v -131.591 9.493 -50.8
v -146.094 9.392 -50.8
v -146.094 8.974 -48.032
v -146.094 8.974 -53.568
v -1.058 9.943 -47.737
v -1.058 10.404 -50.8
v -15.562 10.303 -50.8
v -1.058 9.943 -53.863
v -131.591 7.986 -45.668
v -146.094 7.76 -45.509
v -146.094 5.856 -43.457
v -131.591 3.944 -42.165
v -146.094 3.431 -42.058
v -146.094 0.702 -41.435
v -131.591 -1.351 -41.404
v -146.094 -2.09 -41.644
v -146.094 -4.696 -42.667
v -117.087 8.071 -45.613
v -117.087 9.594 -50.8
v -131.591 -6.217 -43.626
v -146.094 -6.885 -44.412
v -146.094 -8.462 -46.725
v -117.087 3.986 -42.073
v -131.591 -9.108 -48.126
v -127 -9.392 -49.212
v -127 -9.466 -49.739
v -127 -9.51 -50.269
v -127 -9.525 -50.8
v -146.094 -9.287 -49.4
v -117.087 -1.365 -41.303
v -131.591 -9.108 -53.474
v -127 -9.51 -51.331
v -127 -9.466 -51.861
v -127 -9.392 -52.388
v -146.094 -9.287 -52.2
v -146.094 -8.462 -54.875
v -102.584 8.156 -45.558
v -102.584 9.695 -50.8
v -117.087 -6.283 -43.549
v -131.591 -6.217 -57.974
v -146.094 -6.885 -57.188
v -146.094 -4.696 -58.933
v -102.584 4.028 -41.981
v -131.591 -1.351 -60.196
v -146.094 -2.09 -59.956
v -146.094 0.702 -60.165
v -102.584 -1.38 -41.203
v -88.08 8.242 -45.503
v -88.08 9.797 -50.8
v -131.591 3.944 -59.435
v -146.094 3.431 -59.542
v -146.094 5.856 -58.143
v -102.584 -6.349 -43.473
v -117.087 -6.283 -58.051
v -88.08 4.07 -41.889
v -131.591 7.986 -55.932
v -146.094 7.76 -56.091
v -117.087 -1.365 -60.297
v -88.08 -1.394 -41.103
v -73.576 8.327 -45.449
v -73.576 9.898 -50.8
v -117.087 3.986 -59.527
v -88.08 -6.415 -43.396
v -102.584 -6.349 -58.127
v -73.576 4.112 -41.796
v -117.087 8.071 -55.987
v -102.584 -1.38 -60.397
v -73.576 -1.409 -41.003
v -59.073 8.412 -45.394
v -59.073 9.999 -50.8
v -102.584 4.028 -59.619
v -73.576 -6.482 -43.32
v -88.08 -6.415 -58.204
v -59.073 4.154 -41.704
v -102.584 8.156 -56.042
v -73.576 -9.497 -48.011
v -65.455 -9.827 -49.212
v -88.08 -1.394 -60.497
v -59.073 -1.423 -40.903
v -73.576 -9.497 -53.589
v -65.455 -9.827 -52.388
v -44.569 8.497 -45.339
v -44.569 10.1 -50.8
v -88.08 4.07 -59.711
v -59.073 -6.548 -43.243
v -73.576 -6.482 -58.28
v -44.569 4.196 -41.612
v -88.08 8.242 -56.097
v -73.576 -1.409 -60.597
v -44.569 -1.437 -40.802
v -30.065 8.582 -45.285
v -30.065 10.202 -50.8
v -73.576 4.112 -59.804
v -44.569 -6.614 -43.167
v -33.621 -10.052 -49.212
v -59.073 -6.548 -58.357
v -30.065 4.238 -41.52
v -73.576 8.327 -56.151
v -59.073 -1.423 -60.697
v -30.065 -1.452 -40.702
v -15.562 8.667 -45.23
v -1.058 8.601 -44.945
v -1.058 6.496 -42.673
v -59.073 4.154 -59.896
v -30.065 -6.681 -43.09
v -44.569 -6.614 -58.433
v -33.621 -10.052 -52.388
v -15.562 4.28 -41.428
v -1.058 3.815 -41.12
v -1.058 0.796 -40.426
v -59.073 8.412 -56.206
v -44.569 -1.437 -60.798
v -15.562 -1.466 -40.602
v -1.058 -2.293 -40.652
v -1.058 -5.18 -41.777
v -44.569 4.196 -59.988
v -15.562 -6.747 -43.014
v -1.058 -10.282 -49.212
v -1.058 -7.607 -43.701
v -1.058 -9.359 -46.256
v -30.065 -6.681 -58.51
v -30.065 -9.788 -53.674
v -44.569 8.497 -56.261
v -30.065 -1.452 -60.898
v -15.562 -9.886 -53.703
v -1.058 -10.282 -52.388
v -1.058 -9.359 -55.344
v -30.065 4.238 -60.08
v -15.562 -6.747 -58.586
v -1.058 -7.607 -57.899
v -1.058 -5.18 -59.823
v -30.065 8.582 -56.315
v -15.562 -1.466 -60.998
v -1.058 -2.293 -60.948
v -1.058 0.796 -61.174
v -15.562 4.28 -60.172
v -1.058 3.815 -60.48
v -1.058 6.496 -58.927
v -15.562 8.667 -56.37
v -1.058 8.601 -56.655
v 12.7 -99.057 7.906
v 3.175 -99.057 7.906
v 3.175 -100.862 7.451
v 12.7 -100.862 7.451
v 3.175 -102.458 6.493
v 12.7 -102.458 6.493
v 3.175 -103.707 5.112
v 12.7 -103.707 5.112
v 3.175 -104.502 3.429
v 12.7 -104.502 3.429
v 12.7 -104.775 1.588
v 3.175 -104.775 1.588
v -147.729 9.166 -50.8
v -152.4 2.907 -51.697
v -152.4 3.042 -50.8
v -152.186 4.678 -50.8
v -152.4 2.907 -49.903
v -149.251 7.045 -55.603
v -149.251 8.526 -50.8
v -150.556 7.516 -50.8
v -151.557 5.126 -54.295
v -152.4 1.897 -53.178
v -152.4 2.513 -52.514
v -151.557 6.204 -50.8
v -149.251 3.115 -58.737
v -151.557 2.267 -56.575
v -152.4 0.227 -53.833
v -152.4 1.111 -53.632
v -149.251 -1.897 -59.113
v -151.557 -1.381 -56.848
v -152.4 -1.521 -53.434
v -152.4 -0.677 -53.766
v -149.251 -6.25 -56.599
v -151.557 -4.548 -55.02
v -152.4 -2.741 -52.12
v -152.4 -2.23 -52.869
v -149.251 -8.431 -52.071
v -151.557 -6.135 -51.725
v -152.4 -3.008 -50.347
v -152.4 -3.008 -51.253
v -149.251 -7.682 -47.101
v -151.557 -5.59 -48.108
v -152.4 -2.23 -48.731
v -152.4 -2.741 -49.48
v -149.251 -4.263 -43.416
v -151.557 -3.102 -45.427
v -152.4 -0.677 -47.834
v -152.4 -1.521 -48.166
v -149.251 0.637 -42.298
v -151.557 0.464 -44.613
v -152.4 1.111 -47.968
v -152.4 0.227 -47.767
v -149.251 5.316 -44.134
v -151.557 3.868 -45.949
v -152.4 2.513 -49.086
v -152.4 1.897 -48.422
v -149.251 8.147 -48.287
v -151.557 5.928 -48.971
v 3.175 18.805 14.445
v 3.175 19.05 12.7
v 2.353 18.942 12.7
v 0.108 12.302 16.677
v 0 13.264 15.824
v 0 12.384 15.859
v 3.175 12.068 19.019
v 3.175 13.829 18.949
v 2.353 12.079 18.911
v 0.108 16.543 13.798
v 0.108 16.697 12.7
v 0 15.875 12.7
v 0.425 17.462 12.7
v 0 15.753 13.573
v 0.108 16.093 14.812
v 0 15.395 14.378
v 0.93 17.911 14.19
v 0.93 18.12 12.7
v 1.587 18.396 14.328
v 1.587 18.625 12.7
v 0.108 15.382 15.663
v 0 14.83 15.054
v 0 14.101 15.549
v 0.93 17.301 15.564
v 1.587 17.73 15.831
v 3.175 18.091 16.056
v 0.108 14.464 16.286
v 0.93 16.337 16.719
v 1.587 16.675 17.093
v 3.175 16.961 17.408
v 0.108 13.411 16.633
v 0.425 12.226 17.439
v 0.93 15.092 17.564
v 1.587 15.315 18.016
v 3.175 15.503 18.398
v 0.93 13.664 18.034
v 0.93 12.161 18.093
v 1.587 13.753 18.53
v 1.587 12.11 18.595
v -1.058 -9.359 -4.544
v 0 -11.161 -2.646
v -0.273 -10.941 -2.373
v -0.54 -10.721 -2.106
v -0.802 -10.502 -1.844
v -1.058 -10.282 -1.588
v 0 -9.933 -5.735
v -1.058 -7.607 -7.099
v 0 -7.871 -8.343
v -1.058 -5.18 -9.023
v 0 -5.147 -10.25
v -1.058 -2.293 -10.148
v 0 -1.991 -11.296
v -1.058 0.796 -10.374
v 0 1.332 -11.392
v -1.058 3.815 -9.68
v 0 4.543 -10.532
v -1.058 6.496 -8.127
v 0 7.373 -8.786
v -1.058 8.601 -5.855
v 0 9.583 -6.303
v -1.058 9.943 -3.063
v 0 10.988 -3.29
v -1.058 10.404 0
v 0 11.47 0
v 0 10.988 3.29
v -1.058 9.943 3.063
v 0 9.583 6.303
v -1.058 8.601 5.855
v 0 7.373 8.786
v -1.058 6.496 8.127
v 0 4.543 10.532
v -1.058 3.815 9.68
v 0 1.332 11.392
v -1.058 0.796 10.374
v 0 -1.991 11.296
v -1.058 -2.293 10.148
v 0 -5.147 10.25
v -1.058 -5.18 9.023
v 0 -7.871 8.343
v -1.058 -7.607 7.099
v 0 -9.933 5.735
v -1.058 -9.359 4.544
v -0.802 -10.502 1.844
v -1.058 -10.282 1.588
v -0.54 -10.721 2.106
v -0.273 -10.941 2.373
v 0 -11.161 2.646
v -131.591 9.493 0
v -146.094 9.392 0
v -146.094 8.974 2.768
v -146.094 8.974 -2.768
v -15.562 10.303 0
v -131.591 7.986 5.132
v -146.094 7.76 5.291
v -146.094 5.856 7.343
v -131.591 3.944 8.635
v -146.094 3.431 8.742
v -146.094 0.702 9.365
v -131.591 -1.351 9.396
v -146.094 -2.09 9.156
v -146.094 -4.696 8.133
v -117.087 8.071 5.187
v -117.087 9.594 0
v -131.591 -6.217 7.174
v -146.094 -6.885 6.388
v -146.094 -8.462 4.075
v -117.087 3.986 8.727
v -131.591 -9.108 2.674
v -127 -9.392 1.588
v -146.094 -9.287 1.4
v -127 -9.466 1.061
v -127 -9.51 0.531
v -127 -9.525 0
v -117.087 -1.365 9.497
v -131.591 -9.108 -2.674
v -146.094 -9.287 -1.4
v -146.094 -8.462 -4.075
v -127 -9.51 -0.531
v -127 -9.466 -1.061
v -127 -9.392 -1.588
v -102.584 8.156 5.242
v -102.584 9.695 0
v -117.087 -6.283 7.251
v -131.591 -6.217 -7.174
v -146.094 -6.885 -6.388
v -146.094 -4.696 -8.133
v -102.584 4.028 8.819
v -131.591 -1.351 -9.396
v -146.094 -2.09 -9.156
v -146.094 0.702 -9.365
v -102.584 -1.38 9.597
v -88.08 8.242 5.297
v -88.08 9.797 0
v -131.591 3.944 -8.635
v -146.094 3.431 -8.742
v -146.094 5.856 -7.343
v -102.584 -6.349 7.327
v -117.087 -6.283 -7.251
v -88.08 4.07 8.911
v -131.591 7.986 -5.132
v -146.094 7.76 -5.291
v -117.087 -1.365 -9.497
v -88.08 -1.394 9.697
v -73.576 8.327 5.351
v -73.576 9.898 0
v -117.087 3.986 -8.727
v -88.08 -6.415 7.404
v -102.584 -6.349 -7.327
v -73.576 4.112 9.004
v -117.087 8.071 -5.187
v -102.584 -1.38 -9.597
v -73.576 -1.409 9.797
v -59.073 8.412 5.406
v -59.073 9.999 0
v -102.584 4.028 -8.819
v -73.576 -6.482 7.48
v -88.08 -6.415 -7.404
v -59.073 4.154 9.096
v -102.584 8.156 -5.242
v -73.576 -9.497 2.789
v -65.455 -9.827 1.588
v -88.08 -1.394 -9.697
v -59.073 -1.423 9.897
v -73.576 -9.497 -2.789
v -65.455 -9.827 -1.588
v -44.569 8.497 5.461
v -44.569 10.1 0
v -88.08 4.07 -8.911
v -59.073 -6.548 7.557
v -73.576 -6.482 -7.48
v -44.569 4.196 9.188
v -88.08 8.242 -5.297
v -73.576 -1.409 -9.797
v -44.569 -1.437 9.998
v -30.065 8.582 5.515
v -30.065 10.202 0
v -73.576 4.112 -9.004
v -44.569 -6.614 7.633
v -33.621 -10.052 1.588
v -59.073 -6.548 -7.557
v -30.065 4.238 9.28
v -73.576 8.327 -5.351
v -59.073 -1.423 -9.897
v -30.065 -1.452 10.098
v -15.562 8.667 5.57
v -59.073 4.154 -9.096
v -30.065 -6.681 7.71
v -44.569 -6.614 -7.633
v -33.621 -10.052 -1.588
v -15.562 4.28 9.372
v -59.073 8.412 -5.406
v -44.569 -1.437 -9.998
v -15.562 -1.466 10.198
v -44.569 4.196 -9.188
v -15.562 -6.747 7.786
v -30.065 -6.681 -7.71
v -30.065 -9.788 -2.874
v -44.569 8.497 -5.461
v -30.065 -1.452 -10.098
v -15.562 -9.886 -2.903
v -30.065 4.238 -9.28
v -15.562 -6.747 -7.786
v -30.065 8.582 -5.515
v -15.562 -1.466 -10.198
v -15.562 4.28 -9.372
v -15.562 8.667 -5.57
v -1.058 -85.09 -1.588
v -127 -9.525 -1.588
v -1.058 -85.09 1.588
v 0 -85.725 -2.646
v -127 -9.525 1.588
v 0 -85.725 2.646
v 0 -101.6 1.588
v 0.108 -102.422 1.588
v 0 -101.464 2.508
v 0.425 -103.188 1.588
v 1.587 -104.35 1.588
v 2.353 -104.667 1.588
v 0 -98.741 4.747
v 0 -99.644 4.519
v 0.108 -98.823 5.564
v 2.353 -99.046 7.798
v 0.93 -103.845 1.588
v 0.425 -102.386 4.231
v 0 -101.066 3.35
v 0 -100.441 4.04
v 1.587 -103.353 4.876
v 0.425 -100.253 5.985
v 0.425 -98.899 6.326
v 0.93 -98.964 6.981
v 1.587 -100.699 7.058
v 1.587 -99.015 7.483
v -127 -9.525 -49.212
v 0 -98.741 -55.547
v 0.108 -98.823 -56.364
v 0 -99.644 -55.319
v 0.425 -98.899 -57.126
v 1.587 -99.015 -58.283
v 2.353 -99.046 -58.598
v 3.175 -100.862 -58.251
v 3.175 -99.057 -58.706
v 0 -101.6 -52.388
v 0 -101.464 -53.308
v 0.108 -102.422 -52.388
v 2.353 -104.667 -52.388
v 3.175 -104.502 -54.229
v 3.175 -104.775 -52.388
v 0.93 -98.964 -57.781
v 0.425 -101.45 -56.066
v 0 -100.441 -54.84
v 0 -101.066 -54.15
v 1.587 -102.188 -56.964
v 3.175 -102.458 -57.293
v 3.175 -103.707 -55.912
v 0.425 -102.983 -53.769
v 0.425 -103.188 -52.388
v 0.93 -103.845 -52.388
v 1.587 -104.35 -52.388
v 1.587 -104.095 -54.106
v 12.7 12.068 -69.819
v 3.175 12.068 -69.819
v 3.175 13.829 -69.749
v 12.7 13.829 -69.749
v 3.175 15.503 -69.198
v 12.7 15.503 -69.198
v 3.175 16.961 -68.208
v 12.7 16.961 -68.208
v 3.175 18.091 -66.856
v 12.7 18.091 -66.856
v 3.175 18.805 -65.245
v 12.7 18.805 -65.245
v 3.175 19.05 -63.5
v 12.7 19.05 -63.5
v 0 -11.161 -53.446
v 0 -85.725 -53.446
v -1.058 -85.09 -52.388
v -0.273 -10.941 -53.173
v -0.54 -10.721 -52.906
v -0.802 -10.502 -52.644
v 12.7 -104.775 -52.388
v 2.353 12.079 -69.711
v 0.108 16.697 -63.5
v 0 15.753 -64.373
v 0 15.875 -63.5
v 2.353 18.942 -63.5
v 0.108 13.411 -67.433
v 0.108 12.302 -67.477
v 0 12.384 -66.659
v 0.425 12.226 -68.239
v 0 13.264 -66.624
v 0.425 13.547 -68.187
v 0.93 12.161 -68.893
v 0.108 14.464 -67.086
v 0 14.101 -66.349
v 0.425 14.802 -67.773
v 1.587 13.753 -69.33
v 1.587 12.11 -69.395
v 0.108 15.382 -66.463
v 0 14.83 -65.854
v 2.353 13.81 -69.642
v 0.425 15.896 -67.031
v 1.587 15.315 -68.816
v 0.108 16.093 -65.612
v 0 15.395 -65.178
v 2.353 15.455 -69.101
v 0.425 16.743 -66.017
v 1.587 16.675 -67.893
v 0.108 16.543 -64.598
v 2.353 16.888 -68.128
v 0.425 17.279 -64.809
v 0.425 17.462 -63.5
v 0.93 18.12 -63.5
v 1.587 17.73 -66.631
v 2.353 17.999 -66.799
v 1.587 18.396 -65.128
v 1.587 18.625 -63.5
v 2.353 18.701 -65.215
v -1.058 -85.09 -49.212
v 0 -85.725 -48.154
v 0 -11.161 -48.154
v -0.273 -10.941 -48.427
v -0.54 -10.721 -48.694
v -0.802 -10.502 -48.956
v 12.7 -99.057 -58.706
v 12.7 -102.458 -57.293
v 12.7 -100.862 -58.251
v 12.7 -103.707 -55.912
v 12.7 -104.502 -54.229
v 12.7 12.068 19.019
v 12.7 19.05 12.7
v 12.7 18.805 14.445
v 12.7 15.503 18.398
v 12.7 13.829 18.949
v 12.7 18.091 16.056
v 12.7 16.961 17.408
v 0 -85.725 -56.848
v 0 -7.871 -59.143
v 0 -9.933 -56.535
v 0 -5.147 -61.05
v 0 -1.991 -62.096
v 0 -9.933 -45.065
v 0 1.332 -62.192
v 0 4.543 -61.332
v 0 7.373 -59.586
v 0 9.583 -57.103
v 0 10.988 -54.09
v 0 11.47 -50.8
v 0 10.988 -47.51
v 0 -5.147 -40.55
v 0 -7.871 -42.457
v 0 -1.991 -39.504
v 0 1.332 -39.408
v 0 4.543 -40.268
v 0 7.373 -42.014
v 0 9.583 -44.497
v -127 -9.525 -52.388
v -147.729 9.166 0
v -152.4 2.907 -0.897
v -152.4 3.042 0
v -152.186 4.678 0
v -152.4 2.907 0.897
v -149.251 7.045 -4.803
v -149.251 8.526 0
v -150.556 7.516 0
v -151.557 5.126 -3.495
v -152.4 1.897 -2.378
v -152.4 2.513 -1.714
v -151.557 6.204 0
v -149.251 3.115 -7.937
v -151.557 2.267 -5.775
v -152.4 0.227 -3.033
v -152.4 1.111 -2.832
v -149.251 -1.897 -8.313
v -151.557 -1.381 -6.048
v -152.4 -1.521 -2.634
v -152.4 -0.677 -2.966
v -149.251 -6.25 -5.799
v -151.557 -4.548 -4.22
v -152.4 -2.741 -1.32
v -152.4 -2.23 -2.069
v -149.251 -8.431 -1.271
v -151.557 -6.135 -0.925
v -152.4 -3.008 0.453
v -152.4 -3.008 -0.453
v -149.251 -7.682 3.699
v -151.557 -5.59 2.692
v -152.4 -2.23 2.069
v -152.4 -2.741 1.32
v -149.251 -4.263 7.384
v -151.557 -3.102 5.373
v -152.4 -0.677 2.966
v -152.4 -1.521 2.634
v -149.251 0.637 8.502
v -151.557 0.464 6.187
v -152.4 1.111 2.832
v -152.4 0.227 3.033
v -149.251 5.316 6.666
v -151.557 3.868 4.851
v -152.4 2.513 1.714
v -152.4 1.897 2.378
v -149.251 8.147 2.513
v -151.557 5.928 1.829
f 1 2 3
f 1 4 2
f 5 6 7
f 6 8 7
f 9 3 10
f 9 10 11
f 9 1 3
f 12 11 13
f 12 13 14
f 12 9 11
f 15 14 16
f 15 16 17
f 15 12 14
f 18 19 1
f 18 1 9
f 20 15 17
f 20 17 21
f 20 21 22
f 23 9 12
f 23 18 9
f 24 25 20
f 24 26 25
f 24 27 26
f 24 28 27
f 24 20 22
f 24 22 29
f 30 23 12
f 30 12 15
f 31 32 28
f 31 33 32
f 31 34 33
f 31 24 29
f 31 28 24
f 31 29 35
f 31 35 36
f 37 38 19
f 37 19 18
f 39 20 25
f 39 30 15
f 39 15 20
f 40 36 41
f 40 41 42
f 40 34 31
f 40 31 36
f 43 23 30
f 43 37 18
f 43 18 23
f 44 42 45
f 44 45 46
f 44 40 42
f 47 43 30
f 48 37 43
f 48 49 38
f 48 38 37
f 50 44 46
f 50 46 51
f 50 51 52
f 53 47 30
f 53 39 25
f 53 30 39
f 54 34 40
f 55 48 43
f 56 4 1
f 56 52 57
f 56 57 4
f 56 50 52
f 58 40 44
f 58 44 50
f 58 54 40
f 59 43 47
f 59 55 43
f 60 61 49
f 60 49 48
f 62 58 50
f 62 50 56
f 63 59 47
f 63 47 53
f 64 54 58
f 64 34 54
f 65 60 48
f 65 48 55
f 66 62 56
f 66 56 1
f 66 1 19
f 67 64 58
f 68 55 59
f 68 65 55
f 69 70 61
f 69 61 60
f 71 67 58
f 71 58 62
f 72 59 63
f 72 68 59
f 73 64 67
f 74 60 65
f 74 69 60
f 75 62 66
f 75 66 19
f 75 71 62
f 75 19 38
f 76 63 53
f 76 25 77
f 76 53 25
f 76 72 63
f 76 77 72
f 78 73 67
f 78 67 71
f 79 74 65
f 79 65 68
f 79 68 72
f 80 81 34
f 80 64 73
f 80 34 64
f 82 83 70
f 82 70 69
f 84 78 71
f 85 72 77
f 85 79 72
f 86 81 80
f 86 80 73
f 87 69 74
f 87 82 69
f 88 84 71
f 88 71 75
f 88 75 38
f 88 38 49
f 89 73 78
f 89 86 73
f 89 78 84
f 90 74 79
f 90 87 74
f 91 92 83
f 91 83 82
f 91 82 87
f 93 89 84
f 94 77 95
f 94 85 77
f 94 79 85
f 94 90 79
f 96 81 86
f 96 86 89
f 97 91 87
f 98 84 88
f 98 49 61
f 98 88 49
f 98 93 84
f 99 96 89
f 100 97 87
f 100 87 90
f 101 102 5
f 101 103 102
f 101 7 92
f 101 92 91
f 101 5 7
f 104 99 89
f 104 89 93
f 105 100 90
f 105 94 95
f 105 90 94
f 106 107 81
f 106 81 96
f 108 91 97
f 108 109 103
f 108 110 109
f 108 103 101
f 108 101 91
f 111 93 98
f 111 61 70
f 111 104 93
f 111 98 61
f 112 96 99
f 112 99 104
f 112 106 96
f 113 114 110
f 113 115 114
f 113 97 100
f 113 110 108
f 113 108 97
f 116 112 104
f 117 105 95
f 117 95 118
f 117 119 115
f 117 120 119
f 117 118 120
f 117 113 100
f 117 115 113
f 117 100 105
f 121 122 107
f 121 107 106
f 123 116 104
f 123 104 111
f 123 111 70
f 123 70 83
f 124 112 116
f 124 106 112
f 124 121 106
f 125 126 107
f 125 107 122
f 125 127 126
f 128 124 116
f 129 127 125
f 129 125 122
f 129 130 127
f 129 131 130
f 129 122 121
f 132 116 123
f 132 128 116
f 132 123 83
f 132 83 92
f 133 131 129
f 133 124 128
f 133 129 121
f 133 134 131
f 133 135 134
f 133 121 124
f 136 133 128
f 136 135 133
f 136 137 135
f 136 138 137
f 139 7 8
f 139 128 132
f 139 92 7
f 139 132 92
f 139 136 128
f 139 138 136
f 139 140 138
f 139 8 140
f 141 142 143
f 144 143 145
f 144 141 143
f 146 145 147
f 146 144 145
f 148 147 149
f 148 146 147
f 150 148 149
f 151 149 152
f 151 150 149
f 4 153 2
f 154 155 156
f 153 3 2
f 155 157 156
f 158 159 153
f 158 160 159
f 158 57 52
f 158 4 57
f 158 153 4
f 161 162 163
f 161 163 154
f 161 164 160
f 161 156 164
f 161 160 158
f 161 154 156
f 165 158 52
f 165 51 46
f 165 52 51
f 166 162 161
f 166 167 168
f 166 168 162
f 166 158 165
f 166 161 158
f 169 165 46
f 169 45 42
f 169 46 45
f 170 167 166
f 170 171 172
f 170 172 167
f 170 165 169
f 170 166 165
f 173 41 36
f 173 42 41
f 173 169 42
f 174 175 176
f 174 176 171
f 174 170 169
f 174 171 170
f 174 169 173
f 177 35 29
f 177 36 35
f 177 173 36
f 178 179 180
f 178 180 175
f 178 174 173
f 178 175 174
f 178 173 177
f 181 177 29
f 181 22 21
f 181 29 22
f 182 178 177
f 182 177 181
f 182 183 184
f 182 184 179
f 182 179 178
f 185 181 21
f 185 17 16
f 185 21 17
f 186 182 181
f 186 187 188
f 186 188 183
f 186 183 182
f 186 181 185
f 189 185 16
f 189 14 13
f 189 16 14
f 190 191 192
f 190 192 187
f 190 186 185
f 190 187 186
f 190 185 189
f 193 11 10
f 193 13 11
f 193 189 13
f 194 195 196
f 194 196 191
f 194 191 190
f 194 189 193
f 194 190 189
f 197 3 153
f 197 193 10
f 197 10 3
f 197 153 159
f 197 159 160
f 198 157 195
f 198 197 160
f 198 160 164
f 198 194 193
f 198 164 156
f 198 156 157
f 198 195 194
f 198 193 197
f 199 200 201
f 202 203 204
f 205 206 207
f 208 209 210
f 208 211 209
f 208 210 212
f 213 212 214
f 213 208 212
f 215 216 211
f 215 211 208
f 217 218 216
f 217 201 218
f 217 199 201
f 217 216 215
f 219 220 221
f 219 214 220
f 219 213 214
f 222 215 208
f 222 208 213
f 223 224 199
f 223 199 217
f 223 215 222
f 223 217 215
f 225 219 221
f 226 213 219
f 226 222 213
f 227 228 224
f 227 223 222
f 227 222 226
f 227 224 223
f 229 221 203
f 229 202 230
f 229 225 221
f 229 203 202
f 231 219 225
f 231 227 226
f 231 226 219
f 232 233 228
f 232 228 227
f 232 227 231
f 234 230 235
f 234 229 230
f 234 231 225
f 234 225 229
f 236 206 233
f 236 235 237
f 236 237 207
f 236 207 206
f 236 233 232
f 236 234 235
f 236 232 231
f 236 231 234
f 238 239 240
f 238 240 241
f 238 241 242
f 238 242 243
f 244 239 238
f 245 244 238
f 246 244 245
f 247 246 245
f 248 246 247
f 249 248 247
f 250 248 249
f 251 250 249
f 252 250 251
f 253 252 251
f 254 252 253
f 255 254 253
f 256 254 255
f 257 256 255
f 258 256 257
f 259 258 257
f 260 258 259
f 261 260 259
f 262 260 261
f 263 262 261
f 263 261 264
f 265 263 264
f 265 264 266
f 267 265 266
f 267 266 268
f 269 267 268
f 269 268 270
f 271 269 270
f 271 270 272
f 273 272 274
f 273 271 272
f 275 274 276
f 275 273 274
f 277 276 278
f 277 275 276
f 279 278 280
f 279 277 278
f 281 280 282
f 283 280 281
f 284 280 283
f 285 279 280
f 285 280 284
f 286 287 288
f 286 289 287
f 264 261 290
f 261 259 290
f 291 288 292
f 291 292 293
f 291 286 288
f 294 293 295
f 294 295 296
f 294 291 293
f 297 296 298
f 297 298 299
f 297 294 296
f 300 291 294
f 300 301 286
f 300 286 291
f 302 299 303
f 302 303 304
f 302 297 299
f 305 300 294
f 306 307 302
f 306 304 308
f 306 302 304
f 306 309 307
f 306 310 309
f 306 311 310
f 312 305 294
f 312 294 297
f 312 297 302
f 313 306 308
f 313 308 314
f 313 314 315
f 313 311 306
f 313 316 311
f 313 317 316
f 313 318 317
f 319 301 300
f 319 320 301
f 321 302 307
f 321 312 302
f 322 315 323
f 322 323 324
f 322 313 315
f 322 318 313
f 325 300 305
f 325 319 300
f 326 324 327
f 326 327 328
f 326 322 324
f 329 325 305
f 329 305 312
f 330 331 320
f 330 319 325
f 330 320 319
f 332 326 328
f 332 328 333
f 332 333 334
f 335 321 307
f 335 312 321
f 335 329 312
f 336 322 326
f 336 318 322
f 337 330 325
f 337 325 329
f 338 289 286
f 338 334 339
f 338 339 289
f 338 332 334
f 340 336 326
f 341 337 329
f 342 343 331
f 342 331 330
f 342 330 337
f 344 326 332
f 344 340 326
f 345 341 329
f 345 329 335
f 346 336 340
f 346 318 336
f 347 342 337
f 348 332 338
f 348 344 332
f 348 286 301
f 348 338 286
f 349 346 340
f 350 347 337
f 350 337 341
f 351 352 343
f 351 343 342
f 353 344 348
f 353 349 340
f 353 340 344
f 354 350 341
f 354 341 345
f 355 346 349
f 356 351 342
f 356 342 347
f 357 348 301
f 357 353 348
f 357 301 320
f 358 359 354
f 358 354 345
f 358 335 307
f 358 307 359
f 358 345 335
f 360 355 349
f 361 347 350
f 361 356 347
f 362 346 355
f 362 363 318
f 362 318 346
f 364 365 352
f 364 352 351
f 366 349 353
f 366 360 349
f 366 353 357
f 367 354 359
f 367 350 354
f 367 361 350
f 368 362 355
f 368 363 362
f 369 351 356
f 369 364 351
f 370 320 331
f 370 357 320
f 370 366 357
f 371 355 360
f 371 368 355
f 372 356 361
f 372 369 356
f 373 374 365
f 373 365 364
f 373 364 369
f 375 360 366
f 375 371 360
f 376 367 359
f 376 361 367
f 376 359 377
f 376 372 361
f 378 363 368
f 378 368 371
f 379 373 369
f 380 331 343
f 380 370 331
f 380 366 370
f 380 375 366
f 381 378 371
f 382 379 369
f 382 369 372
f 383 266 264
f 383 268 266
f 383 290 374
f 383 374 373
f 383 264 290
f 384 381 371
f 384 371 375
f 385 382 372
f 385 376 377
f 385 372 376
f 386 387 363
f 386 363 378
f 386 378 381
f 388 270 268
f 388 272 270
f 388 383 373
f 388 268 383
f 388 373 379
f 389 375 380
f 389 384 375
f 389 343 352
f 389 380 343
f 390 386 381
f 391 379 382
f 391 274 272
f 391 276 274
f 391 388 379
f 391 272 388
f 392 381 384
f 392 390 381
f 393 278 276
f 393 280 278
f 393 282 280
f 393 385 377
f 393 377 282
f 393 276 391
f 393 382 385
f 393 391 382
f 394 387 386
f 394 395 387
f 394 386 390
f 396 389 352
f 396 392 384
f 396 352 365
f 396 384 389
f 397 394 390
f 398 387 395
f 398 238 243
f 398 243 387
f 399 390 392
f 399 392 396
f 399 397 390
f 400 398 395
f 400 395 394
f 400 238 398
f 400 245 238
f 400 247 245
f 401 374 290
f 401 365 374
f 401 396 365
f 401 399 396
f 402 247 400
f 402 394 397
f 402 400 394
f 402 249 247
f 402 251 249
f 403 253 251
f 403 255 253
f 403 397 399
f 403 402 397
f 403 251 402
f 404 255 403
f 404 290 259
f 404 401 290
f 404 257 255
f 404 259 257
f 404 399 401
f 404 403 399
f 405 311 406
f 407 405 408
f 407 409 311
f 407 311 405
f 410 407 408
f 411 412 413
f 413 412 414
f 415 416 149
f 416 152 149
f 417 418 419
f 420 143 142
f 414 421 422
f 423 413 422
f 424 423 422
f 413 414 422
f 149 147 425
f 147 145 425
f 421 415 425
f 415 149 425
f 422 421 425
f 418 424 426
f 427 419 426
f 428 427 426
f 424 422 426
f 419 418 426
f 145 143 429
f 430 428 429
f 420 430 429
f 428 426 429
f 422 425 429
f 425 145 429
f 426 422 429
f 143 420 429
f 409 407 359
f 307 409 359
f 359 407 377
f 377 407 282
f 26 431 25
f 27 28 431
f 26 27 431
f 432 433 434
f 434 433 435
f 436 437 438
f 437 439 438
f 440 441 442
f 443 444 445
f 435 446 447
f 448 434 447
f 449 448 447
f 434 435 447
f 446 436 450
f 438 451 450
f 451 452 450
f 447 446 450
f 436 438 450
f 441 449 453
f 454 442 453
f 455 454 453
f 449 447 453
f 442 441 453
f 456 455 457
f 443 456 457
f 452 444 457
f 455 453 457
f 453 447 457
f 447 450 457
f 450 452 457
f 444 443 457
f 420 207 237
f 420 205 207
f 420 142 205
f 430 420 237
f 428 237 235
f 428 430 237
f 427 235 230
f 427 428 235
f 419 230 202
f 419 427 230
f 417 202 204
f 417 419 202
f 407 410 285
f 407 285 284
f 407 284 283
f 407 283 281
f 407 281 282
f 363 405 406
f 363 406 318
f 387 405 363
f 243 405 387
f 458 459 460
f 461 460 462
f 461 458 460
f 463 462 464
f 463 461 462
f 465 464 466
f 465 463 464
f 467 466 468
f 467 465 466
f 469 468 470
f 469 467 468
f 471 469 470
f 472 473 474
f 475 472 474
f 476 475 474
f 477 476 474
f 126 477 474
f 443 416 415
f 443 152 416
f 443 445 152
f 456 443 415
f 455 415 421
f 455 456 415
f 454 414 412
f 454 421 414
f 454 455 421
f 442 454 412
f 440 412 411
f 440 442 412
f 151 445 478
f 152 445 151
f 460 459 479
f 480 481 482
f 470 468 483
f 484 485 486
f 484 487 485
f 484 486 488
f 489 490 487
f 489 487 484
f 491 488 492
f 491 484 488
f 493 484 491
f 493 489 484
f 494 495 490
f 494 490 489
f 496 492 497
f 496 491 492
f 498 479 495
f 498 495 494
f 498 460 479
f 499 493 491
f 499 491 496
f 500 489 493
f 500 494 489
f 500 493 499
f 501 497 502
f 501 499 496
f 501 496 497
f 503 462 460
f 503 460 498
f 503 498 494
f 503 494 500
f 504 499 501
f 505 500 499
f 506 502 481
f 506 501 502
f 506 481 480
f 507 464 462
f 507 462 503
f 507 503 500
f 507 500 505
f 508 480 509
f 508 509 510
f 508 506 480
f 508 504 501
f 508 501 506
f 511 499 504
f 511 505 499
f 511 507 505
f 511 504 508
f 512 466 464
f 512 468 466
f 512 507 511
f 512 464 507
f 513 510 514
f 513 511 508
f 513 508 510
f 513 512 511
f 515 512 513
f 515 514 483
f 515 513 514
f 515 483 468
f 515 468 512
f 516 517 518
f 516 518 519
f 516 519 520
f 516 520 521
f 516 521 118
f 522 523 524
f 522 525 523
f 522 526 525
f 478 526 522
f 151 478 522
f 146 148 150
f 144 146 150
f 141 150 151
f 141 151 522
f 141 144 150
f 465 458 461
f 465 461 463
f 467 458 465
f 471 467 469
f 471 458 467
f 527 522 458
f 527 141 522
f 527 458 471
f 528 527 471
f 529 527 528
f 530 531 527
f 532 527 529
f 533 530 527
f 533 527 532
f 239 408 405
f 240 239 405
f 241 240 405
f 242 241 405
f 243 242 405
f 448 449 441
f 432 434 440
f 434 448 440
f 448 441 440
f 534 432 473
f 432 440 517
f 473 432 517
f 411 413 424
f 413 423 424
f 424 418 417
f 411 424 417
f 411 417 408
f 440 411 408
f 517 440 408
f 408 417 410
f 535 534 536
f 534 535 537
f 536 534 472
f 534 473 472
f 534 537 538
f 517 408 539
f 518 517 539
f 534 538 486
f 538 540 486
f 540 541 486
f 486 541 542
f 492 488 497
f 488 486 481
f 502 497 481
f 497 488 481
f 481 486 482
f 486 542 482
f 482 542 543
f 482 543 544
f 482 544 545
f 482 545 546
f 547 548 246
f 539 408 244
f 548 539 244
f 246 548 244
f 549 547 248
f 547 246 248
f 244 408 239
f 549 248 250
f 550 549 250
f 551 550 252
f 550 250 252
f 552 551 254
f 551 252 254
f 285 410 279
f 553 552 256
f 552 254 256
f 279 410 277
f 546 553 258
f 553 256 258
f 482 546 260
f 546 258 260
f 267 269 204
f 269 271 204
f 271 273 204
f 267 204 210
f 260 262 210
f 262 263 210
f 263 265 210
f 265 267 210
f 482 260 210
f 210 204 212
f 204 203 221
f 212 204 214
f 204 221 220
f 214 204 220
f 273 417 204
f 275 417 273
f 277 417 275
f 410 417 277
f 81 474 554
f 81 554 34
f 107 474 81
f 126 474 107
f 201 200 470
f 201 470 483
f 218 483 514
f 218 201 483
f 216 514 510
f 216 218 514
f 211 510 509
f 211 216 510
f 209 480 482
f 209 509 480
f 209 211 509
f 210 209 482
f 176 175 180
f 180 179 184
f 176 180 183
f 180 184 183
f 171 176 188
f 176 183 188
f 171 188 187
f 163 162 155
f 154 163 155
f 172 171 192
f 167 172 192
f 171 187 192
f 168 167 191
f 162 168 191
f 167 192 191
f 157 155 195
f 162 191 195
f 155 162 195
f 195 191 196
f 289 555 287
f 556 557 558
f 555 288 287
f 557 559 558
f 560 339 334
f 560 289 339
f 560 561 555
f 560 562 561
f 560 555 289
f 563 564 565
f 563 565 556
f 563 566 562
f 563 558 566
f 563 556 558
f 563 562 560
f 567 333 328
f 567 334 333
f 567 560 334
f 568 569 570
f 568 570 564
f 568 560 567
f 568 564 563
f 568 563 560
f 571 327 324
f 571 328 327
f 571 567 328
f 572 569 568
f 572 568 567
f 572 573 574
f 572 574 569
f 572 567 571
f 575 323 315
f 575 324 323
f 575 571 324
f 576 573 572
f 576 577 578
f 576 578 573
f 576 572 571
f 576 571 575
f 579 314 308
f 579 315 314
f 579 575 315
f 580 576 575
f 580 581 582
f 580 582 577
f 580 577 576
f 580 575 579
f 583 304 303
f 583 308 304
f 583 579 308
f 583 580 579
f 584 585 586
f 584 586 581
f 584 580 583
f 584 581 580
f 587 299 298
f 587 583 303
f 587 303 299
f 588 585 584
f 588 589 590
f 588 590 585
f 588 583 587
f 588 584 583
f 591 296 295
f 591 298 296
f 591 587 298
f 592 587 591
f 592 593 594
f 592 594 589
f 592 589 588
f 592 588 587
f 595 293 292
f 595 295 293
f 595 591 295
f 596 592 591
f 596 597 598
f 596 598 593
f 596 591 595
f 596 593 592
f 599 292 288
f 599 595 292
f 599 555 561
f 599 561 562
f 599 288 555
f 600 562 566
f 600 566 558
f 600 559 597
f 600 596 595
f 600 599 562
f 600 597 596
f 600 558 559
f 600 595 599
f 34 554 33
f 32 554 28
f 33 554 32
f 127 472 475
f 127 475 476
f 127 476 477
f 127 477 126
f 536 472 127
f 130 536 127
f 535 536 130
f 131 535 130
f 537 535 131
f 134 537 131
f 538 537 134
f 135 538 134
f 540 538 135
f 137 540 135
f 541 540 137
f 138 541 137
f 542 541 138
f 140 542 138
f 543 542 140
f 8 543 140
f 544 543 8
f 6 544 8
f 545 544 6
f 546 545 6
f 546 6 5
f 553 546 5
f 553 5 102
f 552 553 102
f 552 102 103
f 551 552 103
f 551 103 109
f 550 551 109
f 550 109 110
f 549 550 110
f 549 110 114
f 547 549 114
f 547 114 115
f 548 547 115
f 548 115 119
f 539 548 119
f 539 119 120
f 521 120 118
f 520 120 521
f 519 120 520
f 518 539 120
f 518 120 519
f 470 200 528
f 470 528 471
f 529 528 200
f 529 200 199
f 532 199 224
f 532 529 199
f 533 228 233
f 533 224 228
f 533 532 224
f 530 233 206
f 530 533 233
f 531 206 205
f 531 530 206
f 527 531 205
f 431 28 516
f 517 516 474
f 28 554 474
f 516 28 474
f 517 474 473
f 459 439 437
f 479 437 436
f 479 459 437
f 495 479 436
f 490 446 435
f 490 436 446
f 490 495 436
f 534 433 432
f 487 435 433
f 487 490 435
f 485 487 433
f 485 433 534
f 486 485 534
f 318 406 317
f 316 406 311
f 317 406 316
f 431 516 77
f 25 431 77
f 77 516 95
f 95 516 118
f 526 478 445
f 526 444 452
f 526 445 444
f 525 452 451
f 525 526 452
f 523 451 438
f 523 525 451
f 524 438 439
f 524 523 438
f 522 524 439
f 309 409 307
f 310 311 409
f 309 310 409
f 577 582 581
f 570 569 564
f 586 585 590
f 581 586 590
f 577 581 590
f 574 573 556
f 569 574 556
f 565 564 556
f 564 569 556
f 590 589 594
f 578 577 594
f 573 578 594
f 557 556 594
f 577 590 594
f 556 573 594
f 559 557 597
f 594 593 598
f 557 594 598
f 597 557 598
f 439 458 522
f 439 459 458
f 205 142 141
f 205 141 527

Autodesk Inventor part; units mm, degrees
ref_plane "YZ Plane" through (0, 0, 0) normal (1, 0, 0) x (0, 1, 0)
ref_plane "XZ Plane" through (0, 0, 0) normal (0, 1, 0) x (-1, 0, 0)
ref_plane "XY Plane" through (0, 0, 0) normal (0, 0, 1) x (1, 0, 0)
sketch "Sketch3" plane through (0, 0, 0) normal (1, 0, 0) x (0, 1, 0)
  line L0 (-85.725, 0) -> (-85.725, -1.5875)
  line L1 (-85.725, -1.5875) -> (-85.725, 1.5875)
  line L2 (-85.725, 1.5875) -> (-9.3918, 1.5875)
  line L3 (-85.725, -1.5875) -> (-9.3918, -1.5875)
  line L4 (-85.725, -50.8) -> (-85.725, -49.2125)
  line L5 (-85.725, -49.2125) -> (-85.725, -52.3875)
  line L6 (-85.725, -52.3875) -> (-9.3918, -52.3875)
  line L7 (-85.725, -49.2125) -> (-9.3918, -49.2125)
  circle A0 centre (0, 0) radius 9.525
  circle A1 centre (0, -50.8) radius 9.525
  line L8 (-98.425, 1.5875) -> (12.7, 12.7)
  line L9 (-98.425, -52.3875) -> (12.7, -63.5)
  line L10 (12.7, 12.7) -> (12.7, -63.5)
  line L11 (-98.425, -52.3875) -> (-98.425, 1.5875)
  line L12 (19.05, -70.5167) -> (-104.775, -58.1342)
  line L13 (-104.775, -58.1342) -> (-104.775, 7.3342)
  line L14 (-104.775, 7.3342) -> (19.05, 19.7167)
  line L15 (19.05, 19.7167) -> (19.05, -70.5167)
  dimension "d14" = 1.5875
  dimension "d15" = 3.175
  dimension "d40" = 6.35
extrude "Extrusion2" add sketch "Sketch3" along normal blind 12.7 contours L1 L2 A0 L3 L0 | A0 | L4 L7 A1 L6 L5 | A1 | L8 L10 L9 L11 | L12 L13 L14 L15
extrude "Extrusion3" add sketch "Sketch3" against normal blind 152.4 contours A0 | A1
extrude "Extrusion4" add sketch "Sketch3" against normal blind 127 contours L1 L2 A0 L3 L0 | L4 L7 A1 L6 L5
sketch "Sketch4" plane through (-127, -9.3918, 1.5875) normal (0, 0, 1) x (1, 0, 0)
  line L0 (0, -0.1332) -> (-25.4, -0.1332) projected
  line L1 (127, -76.3332) -> (0, -76.3332) projected
  line L2 (0, -0.1332) -> (127, -76.3332)
  line L3 (127, -76.3332) -> (0, -76.3332)
  line L4 (0, 0) -> (0, -0.1332) projected
  line L5 (0, -76.3332) -> (0, -0.1332)
  point P0 (127, 9.3918)
extrude "Extrusion5" cut sketch "Sketch4" against normal blind 127
draft "FaceDraft2" angle 0.4 pull direction (-1, 0, 0) faces at (-93.1333, -8.9299, 3.314) fixed edges at (-127, -9.4916, -0.7965) (-127, -9.4916, 0.7965)
draft "FaceDraft3" angle 0.4 pull direction (-1, 0, 0) faces at (-93.1333, -8.9299, -47.486) fixed edges at (-127, -9.4916, -51.5965) (-127, -9.4916, -50.0035)
fillet "Fillet3" radius 6.35 2 edges at (-152.4, -9.3477, 0) (-152.4, -9.3477, -50.8)
fillet "Fillet5" radius 6.35 4 edges at (6.35, 19.05, -70.5167) (6.35, 19.05, 19.7167) (6.35, -104.775, -58.1342) (6.35, -104.775, 7.3342)
fillet "Fillet6" radius 3.175 9 edges at (0, -103.1332, 5.8484) (0, -104.775, -25.4) (0, -103.1332, -56.6484) (0, -36.8284, -64.9288) (0, -92.3909, -59.3726) (0, 16.9609, -68.2082) (0, 19.05, -25.4) (0, 16.9609, 17.4082) (0, -43.4943, 13.4622)
chamfer "Chamfer1" distance 1.0583 angle 45 8 edges at (0, 0.7961, -40.4188) (0, 0.7961, -61.1812) (0, -48.0075, -52.3875) (0, 0.7961, 10.3812) (0, 0.7961, -10.3812) (0, -48.0075, -1.5875) (0, -48.0075, -49.2125) (0, -48.0075, 1.5875)
properties part number "Ski Rack"
